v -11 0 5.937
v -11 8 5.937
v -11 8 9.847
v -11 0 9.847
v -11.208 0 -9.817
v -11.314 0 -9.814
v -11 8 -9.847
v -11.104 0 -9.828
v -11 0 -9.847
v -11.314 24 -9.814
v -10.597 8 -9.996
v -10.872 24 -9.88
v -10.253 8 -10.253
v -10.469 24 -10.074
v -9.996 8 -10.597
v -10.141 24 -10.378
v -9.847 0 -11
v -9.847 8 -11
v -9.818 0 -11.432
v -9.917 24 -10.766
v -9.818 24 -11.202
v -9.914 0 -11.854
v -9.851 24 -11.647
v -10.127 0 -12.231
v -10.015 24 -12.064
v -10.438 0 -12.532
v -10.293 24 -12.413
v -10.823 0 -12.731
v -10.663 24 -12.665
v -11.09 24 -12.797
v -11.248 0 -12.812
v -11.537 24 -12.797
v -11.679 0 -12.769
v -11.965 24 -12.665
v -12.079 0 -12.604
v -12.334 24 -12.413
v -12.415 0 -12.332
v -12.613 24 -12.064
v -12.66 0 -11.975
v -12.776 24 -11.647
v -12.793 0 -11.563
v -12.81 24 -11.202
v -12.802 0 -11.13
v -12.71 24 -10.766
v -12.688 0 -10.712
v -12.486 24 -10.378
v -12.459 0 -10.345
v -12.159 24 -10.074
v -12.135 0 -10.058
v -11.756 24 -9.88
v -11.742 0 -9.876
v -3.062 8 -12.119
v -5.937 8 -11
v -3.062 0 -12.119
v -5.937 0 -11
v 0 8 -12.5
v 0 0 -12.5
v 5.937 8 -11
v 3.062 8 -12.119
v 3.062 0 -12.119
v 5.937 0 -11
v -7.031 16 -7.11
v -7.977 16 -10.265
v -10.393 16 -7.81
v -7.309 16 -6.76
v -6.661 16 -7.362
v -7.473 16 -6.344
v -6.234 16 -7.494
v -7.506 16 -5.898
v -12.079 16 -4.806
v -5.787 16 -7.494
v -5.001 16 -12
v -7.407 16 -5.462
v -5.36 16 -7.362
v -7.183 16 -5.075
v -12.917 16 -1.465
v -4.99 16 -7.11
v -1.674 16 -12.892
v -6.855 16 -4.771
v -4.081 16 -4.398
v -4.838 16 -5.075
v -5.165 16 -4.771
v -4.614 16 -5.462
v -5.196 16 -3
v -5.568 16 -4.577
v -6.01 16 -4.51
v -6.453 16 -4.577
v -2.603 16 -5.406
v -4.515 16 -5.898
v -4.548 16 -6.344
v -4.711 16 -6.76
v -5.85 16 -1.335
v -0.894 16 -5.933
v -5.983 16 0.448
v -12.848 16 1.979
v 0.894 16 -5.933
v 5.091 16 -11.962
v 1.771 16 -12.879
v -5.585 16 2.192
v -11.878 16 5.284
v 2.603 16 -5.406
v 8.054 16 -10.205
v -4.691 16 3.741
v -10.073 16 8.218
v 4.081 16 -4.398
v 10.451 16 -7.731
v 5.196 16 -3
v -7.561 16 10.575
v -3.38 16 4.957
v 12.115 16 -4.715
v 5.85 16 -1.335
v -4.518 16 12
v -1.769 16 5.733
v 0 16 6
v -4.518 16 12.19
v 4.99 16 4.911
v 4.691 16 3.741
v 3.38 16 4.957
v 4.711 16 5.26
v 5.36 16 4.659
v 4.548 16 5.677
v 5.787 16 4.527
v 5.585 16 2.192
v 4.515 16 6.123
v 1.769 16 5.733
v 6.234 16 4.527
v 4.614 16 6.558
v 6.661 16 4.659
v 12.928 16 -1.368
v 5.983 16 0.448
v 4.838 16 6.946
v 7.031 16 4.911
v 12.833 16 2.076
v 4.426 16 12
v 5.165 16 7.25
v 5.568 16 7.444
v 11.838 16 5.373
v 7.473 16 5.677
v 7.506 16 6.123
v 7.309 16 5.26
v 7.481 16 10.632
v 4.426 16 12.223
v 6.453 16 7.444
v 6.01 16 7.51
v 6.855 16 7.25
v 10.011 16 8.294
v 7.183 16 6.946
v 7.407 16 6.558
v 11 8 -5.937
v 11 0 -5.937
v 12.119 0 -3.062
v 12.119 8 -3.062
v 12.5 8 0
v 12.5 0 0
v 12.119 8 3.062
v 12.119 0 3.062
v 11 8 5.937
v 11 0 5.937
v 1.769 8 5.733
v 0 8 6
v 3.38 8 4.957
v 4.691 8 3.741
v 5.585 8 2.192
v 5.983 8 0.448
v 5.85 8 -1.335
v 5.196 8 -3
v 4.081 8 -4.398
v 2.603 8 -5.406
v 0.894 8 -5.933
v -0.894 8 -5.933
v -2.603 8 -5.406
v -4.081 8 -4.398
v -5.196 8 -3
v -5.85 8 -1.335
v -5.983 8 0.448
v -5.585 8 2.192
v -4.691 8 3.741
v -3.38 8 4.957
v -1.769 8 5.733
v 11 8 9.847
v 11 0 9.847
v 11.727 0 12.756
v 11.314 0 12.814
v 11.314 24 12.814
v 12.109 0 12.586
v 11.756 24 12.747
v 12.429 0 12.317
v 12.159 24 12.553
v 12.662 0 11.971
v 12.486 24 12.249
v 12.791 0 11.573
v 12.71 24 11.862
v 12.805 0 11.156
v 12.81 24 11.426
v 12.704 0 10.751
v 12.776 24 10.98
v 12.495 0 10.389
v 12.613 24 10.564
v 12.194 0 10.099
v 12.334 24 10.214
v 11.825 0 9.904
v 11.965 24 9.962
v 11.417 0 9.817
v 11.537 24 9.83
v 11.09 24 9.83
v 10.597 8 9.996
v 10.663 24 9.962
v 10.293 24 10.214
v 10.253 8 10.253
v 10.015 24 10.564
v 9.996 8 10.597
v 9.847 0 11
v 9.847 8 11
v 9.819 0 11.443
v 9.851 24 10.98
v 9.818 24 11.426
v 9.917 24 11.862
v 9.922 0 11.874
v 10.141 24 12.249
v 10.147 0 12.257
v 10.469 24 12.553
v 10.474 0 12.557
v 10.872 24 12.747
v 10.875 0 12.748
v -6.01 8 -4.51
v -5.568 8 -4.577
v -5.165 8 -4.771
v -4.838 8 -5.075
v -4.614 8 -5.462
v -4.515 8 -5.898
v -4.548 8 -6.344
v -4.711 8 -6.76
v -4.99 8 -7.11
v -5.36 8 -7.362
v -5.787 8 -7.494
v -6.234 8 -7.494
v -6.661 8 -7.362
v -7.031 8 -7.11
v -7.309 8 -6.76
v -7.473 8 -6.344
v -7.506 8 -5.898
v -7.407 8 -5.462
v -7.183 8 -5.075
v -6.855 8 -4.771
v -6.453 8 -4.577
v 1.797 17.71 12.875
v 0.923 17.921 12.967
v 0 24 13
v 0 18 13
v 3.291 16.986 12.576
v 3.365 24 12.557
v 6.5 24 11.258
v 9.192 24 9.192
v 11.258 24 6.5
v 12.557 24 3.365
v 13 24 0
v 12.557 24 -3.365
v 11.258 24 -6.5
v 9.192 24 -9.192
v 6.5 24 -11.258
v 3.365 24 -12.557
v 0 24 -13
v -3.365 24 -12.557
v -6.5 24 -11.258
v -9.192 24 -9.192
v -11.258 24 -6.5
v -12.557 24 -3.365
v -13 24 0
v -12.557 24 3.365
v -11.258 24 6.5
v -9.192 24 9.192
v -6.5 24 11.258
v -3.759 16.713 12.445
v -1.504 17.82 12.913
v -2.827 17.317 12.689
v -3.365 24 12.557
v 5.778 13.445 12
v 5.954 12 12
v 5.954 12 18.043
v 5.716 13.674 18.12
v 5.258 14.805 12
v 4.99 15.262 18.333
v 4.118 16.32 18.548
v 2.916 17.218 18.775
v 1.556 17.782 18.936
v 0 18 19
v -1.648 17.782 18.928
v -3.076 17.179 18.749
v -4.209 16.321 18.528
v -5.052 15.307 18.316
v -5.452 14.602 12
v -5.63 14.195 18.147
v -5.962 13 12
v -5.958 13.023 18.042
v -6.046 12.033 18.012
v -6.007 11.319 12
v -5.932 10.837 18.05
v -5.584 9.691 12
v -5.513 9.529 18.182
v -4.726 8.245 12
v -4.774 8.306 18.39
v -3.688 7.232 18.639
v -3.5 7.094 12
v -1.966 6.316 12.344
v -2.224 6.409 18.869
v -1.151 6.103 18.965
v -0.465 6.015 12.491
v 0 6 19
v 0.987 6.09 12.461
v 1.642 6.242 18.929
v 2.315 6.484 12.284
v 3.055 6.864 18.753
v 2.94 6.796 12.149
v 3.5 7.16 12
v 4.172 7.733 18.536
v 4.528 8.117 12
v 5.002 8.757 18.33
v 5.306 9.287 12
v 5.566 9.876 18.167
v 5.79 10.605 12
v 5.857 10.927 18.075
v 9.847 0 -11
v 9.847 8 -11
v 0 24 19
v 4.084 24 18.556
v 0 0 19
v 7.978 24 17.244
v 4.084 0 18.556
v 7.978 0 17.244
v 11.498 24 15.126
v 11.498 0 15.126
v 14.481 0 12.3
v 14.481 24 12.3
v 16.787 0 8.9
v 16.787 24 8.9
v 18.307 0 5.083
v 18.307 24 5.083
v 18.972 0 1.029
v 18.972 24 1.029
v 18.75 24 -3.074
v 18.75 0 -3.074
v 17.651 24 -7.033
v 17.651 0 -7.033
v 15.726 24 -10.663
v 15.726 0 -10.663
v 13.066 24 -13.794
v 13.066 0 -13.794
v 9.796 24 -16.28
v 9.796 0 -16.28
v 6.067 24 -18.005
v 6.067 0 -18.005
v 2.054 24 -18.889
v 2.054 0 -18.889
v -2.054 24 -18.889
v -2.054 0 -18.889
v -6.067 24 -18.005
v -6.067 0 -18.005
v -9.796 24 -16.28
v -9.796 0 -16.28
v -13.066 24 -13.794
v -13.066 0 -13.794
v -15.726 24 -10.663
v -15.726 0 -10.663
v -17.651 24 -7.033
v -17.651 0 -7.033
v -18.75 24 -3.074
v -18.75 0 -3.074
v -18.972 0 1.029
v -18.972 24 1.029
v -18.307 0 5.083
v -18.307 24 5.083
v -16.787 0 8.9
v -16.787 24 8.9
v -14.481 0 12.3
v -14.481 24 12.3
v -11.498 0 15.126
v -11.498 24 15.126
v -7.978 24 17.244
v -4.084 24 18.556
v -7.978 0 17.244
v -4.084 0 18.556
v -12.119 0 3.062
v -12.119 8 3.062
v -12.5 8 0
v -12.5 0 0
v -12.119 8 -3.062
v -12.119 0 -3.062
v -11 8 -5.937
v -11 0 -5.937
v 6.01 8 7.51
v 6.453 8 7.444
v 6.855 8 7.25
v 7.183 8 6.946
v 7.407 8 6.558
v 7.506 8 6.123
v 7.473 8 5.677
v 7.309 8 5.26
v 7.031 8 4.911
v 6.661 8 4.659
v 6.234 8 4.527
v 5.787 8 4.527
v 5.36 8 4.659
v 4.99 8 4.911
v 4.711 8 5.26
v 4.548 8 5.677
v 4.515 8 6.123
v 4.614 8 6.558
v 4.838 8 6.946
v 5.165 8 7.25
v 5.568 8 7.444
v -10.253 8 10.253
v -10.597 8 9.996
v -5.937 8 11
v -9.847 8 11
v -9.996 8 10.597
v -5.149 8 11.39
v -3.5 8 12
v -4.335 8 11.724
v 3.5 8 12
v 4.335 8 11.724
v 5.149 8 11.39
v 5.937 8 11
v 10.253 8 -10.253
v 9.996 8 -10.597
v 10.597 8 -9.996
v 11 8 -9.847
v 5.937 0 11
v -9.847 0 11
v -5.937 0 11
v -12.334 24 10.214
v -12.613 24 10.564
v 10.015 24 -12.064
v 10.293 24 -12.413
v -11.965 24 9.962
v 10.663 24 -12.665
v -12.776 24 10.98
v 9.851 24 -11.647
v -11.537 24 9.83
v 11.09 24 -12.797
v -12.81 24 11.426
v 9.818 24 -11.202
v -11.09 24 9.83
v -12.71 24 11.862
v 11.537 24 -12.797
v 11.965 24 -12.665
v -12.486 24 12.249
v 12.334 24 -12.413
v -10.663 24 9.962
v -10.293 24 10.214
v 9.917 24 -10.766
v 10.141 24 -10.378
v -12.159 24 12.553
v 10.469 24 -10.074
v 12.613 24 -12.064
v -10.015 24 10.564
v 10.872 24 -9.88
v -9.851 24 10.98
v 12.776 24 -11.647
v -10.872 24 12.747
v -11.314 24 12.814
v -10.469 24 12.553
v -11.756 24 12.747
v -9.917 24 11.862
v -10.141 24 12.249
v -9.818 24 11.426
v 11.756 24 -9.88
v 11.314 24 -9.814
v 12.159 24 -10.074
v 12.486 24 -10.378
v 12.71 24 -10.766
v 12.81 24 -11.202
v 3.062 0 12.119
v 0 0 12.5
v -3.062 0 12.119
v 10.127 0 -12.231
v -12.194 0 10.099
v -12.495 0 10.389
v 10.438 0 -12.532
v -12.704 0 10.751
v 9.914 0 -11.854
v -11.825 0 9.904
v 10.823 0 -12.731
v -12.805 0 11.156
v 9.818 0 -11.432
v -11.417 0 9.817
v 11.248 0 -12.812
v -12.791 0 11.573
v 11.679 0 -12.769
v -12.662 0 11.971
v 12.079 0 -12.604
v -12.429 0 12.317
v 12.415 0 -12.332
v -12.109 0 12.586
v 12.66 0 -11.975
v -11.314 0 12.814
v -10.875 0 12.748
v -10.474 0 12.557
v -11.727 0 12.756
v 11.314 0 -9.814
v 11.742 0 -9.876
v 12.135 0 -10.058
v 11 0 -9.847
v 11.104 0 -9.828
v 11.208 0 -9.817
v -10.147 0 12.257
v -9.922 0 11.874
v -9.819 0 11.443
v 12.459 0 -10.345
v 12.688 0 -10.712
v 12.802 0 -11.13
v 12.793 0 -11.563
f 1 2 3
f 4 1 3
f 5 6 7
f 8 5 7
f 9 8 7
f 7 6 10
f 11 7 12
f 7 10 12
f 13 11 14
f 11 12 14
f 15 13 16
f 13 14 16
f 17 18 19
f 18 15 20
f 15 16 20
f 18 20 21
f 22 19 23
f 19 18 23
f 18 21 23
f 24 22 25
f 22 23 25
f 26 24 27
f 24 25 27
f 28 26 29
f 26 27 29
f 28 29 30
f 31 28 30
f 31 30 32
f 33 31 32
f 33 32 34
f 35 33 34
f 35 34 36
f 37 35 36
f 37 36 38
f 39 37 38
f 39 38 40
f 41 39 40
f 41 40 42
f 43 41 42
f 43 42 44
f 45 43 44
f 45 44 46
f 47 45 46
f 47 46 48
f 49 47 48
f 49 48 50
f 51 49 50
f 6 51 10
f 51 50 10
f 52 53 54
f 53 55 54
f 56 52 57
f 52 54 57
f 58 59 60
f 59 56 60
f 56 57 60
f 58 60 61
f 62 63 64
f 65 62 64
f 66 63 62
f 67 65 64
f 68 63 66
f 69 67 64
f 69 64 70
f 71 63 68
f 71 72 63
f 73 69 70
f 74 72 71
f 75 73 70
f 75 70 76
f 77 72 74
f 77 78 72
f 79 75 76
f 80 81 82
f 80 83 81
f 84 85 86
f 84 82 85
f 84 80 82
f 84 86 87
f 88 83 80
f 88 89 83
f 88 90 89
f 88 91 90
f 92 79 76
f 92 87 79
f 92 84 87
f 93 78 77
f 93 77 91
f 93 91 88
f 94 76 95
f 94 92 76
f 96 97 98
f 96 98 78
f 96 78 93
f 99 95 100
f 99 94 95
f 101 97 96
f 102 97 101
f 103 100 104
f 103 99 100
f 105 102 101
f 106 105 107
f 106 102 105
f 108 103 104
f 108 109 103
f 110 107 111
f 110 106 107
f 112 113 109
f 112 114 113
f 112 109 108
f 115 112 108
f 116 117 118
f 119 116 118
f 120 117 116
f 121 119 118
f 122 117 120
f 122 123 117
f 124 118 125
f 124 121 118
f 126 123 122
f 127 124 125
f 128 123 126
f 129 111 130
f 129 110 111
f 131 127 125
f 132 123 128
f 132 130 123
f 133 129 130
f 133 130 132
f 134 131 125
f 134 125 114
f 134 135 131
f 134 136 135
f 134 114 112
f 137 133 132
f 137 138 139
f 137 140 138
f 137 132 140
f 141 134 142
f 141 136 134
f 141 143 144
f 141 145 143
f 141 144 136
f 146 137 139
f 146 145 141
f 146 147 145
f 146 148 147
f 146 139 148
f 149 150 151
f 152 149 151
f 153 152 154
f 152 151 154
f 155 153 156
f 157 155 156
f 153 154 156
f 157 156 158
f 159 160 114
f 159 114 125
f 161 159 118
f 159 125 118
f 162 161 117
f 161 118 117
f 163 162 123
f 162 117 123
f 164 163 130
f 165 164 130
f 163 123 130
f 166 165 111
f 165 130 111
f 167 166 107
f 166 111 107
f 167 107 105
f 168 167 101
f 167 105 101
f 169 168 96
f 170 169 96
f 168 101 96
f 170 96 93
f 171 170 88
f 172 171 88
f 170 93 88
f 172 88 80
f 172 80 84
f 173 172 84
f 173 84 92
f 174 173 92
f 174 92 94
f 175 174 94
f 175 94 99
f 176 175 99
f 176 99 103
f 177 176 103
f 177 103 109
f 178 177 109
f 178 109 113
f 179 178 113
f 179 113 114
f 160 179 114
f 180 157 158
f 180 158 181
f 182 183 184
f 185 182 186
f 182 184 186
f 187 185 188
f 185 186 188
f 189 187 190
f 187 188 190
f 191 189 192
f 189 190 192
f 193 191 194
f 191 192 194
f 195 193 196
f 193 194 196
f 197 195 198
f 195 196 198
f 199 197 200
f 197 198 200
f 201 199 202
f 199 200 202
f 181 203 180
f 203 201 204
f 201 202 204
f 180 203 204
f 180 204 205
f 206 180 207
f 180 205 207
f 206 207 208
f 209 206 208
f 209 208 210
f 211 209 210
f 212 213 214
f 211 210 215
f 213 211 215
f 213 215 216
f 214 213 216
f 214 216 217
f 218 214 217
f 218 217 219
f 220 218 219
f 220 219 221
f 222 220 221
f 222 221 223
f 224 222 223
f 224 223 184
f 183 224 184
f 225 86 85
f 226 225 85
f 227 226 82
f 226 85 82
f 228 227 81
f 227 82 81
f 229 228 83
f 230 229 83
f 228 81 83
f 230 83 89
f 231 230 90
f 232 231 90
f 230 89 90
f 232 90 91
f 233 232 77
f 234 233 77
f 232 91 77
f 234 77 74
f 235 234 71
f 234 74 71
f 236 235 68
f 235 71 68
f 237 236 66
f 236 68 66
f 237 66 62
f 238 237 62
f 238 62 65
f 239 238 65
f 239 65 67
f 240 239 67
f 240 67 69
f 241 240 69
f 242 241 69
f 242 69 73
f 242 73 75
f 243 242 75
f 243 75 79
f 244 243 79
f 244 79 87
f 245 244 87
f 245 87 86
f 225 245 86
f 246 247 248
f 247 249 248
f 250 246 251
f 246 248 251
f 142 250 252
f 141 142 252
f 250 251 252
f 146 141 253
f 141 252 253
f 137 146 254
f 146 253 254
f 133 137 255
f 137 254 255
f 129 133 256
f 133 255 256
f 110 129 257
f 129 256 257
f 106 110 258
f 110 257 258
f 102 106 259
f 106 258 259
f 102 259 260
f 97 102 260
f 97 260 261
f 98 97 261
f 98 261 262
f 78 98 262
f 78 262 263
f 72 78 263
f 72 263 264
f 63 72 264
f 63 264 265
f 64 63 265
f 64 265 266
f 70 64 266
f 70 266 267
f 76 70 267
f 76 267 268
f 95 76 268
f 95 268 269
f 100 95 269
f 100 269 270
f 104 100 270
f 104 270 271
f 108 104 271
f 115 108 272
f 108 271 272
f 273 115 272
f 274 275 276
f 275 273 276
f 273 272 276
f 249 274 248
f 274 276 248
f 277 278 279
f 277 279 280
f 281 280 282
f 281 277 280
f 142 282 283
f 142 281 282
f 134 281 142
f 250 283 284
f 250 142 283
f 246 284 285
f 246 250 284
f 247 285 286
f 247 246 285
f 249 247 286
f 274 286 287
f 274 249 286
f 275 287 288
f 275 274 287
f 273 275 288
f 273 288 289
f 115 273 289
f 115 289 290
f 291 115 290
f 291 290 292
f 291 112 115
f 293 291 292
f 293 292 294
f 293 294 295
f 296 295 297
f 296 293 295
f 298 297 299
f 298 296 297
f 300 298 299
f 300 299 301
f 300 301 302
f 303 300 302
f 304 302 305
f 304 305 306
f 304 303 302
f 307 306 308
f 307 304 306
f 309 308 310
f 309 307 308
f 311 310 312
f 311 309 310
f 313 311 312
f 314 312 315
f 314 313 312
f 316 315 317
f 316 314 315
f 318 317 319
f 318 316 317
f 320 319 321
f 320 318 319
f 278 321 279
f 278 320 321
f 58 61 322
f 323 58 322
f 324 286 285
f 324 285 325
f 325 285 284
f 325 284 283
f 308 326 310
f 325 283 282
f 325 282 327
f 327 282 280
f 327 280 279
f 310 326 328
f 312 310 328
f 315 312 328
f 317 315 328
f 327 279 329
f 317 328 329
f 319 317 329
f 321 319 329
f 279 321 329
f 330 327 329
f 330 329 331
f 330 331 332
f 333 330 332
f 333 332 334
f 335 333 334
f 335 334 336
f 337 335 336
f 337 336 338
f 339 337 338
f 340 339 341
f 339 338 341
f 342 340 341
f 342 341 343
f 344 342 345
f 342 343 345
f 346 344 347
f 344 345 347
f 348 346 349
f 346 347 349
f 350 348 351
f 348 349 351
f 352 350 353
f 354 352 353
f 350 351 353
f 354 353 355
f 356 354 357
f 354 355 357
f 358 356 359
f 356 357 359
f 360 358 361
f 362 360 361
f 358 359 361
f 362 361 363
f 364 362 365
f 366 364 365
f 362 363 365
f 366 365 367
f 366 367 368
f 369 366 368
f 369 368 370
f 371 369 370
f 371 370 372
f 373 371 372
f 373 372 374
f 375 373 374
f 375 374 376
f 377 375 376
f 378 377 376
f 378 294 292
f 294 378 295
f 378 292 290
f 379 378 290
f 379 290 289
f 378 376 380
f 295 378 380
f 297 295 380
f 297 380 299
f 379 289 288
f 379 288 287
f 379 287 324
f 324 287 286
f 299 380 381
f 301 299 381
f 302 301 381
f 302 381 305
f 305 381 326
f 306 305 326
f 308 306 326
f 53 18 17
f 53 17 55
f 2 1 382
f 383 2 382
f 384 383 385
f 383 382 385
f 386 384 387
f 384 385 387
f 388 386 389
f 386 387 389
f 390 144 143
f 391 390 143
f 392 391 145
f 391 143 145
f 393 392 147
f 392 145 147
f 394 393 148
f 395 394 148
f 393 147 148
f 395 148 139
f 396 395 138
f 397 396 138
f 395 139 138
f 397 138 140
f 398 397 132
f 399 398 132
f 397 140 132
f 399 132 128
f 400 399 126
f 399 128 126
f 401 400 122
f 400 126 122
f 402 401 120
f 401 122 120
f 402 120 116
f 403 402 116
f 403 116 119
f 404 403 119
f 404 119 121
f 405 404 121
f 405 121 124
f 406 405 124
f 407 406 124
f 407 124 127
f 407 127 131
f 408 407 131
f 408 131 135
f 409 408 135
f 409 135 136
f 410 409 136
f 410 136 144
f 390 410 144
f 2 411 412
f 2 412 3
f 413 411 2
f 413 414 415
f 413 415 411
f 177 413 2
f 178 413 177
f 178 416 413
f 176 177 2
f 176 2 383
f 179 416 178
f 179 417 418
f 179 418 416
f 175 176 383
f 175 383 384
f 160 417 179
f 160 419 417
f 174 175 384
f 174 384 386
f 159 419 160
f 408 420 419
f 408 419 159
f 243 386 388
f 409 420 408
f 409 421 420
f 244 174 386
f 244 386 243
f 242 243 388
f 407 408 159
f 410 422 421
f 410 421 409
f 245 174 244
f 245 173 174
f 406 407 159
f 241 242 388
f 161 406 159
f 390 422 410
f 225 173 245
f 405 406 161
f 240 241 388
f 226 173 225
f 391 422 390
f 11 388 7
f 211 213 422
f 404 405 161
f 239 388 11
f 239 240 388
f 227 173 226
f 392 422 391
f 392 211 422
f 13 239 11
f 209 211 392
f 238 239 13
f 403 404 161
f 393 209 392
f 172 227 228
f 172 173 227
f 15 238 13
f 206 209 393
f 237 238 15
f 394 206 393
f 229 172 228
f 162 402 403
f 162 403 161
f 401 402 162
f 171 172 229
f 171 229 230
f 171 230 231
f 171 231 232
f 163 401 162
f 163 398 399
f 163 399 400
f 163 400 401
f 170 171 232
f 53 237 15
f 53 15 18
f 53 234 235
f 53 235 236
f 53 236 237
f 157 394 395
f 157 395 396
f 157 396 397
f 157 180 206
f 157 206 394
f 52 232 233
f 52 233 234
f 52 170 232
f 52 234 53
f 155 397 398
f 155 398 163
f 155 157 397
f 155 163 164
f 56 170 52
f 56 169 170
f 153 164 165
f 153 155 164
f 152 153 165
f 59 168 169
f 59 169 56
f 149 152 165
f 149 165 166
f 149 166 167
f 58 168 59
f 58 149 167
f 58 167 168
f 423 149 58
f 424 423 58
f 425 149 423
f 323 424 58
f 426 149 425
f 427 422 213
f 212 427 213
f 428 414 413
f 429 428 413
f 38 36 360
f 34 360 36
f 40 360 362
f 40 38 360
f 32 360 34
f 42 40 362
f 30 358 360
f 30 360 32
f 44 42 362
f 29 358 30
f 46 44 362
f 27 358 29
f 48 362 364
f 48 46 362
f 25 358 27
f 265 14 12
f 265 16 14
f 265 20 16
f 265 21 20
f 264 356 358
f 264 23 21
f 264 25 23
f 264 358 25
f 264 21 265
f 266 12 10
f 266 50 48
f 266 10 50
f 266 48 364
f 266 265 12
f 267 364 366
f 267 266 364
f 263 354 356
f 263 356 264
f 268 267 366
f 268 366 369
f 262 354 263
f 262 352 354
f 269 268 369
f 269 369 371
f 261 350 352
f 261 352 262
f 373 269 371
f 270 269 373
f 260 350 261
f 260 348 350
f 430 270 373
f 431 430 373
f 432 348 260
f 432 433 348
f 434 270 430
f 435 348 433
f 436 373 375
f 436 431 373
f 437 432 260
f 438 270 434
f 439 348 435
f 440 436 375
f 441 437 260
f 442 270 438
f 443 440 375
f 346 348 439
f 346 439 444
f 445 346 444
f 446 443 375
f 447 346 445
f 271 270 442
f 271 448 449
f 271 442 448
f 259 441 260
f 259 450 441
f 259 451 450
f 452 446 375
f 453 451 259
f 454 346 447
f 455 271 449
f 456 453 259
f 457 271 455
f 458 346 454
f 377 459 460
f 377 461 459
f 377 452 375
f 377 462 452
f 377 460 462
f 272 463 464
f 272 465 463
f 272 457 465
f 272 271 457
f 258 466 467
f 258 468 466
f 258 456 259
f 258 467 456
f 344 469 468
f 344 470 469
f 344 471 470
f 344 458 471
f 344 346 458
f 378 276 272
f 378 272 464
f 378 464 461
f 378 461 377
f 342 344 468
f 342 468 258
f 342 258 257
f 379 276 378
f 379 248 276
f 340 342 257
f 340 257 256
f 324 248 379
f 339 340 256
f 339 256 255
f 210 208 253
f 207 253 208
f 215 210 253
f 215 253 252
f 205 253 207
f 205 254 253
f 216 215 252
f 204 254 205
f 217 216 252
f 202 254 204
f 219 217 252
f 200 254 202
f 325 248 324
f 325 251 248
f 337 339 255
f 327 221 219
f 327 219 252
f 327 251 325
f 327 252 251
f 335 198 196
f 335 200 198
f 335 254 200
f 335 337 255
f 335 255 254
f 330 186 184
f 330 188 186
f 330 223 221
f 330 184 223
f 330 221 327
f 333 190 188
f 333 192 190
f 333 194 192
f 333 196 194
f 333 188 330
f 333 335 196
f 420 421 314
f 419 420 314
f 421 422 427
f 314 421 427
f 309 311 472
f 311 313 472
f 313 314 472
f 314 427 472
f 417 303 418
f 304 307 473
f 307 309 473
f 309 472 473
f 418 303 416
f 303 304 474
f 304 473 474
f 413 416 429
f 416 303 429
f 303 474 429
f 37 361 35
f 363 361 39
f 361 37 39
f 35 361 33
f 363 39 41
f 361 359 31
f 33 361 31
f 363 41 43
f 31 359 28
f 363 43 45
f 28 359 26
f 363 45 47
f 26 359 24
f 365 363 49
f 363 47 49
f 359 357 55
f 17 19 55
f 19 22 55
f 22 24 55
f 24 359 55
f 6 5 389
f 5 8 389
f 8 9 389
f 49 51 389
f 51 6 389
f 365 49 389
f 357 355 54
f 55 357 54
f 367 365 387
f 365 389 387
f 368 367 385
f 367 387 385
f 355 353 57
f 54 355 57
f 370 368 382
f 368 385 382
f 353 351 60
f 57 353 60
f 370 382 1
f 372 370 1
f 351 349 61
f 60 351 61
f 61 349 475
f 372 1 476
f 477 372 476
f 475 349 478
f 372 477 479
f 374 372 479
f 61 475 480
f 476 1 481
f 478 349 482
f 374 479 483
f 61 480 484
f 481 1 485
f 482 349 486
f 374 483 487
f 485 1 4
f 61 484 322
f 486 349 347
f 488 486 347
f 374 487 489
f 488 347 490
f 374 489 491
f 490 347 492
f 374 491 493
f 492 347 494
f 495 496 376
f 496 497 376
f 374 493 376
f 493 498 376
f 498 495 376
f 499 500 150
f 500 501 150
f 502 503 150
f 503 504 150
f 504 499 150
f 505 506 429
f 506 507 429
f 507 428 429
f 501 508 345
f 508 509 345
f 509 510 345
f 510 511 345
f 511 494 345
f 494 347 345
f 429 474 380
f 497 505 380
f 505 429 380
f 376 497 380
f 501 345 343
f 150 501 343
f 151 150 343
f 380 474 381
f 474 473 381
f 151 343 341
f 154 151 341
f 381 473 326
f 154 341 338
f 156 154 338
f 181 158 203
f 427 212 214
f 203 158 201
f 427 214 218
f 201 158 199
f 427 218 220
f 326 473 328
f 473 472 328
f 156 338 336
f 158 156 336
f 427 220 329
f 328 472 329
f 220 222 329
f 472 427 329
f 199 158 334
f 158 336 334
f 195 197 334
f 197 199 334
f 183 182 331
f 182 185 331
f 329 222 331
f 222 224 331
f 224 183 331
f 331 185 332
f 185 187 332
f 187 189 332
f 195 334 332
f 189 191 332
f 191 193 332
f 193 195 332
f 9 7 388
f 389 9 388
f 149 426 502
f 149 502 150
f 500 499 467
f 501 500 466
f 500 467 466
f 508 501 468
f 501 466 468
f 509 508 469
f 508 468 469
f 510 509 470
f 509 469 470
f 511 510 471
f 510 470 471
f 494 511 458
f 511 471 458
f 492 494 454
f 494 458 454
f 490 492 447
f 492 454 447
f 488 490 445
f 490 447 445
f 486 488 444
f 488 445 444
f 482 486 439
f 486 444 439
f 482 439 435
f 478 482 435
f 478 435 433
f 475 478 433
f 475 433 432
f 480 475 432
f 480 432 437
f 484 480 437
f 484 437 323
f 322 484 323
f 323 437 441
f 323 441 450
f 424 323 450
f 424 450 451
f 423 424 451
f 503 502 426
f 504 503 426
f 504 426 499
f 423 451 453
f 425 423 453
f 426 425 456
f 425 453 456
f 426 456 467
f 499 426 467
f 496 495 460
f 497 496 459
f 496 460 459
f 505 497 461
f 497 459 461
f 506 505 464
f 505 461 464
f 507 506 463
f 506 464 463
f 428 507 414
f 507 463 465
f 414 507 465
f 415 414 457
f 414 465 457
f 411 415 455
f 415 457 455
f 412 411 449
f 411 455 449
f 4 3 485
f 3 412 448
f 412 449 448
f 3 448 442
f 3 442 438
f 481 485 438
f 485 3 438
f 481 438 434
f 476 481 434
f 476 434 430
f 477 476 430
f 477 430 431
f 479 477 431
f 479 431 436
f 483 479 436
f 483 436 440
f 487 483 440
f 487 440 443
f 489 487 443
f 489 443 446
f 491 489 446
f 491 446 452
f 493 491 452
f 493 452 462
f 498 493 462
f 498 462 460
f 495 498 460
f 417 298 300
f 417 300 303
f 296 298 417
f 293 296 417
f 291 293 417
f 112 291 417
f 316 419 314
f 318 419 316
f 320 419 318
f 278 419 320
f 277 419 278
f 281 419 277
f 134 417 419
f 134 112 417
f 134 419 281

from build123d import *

# Parameters (mm, degrees)
SKETCH1_R              = 19
BOSS_EXTRUDE1_DEPTH    = 24
SKETCH2_R              = 13
CUT_EXTRUDE1_DEPTH     = 8
SKETCH3_R              = 6
CUT_EXTRUDE2_DEPTH     = 32.272991542
SKETCH4_R              = 12.5
CUT_EXTRUDE3_DEPTH     = 8
SKETCH5_W              = 22
SKETCH5_H              = 22
CUT_EXTRUDE4_DEPTH     = 8
CUT_EXTRUDE5_START     = 12
CUT_EXTRUDE5_OUTLINE_R = 6
CUT_EXTRUDE5_DEPTH     = 7.000000101
SKETCH6_R              = 1.5
CUT_EXTRUDE6_DEPTH     = 32.272991715
SKETCH7_R              = 1.5
CUT_EXTRUDE7_DEPTH     = 24


# Read off the part's stored shape, not the designer's step: Cut-Extrude5
with BuildPart() as part:
    # Sketch1 → Boss-Extrude1 (new body)
    with BuildSketch(Plane(origin=(0, 0, 0), x_dir=(1, 0, 0), z_dir=(0, 1, 0))):
        with Locations(Location((0, 0, 0), (0, 0, 270))):
            Circle(SKETCH1_R)
    extrude(amount=BOSS_EXTRUDE1_DEPTH)

    # Sketch2 → Cut-Extrude1 (cut)
    with BuildSketch(Plane(origin=(0, 24, 0), x_dir=(1, 0, 0), z_dir=(0, 1, 0))):
        with Locations(Location((0, 0, 0), (0, 0, 270))):
            Circle(SKETCH2_R)
    extrude(amount=-CUT_EXTRUDE1_DEPTH, mode=Mode.SUBTRACT)

    # Sketch3 → Cut-Extrude2 (cut, through all)
    with BuildSketch(Plane(origin=(0, 16, 0), x_dir=(1, 0, 0), z_dir=(0, 1, 0))):
        with Locations(Location((0, 0, 0), (0, 0, 270))):
            Circle(SKETCH3_R)
    extrude(amount=-CUT_EXTRUDE2_DEPTH, mode=Mode.SUBTRACT)

    # Sketch4 → Cut-Extrude3 (cut)
    with BuildSketch(Plane.XZ):
        with Locations(Location((0, 0, 0), (0, 0, 270))):
            Circle(SKETCH4_R)
    extrude(amount=-CUT_EXTRUDE3_DEPTH, mode=Mode.SUBTRACT)

    # Sketch5 → Cut-Extrude4 (cut)
    with BuildSketch(Plane.XZ):
        Rectangle(SKETCH5_W, SKETCH5_H)
    extrude(amount=-CUT_EXTRUDE4_DEPTH, mode=Mode.SUBTRACT)

    # Cut-Extrude5 outline → Cut-Extrude5 (cut)
    with BuildSketch(Plane.XY.offset(CUT_EXTRUDE5_START)):
        with Locations((-0.045844334, 12)):
            Circle(CUT_EXTRUDE5_OUTLINE_R)
    extrude(amount=CUT_EXTRUDE5_DEPTH, mode=Mode.SUBTRACT)

    # Sketch6 → Cut-Extrude6 (cut, through all)
    with BuildSketch(Plane(origin=(0, 16, 0), x_dir=(1, 0, 0), z_dir=(0, 1, 0))):
        with Locations(Location((-6.01040764, 6.01040764, 0), (0, 0, 270))):
            Circle(SKETCH6_R)
        with Locations(Location((6.01040764, -6.01040764, 0), (0, 0, 270))):
            Circle(SKETCH6_R)
    extrude(amount=-CUT_EXTRUDE6_DEPTH, mode=Mode.SUBTRACT)

    # Sketch7 → Cut-Extrude7 (cut)
    with BuildSketch(Plane(origin=(0, 24, 0), x_dir=(1, 0, 0), z_dir=(0, 1, 0))):
        with Locations(Location((11.313708499, -11.313708499, 0), (0, 0, 270))):
            Circle(SKETCH7_R)
        with Locations(Location((-11.313708499, -11.313708499, 0), (0, 0, 270))):
            Circle(SKETCH7_R)
        with Locations(Location((-11.313708499, 11.313708499, 0), (0, 0, 270))):
            Circle(SKETCH7_R)
        with Locations(Location((11.313708499, 11.313708499, 0), (0, 0, 270))):
            Circle(SKETCH7_R)
    extrude(amount=-CUT_EXTRUDE7_DEPTH, mode=Mode.SUBTRACT)


solid = part.part
